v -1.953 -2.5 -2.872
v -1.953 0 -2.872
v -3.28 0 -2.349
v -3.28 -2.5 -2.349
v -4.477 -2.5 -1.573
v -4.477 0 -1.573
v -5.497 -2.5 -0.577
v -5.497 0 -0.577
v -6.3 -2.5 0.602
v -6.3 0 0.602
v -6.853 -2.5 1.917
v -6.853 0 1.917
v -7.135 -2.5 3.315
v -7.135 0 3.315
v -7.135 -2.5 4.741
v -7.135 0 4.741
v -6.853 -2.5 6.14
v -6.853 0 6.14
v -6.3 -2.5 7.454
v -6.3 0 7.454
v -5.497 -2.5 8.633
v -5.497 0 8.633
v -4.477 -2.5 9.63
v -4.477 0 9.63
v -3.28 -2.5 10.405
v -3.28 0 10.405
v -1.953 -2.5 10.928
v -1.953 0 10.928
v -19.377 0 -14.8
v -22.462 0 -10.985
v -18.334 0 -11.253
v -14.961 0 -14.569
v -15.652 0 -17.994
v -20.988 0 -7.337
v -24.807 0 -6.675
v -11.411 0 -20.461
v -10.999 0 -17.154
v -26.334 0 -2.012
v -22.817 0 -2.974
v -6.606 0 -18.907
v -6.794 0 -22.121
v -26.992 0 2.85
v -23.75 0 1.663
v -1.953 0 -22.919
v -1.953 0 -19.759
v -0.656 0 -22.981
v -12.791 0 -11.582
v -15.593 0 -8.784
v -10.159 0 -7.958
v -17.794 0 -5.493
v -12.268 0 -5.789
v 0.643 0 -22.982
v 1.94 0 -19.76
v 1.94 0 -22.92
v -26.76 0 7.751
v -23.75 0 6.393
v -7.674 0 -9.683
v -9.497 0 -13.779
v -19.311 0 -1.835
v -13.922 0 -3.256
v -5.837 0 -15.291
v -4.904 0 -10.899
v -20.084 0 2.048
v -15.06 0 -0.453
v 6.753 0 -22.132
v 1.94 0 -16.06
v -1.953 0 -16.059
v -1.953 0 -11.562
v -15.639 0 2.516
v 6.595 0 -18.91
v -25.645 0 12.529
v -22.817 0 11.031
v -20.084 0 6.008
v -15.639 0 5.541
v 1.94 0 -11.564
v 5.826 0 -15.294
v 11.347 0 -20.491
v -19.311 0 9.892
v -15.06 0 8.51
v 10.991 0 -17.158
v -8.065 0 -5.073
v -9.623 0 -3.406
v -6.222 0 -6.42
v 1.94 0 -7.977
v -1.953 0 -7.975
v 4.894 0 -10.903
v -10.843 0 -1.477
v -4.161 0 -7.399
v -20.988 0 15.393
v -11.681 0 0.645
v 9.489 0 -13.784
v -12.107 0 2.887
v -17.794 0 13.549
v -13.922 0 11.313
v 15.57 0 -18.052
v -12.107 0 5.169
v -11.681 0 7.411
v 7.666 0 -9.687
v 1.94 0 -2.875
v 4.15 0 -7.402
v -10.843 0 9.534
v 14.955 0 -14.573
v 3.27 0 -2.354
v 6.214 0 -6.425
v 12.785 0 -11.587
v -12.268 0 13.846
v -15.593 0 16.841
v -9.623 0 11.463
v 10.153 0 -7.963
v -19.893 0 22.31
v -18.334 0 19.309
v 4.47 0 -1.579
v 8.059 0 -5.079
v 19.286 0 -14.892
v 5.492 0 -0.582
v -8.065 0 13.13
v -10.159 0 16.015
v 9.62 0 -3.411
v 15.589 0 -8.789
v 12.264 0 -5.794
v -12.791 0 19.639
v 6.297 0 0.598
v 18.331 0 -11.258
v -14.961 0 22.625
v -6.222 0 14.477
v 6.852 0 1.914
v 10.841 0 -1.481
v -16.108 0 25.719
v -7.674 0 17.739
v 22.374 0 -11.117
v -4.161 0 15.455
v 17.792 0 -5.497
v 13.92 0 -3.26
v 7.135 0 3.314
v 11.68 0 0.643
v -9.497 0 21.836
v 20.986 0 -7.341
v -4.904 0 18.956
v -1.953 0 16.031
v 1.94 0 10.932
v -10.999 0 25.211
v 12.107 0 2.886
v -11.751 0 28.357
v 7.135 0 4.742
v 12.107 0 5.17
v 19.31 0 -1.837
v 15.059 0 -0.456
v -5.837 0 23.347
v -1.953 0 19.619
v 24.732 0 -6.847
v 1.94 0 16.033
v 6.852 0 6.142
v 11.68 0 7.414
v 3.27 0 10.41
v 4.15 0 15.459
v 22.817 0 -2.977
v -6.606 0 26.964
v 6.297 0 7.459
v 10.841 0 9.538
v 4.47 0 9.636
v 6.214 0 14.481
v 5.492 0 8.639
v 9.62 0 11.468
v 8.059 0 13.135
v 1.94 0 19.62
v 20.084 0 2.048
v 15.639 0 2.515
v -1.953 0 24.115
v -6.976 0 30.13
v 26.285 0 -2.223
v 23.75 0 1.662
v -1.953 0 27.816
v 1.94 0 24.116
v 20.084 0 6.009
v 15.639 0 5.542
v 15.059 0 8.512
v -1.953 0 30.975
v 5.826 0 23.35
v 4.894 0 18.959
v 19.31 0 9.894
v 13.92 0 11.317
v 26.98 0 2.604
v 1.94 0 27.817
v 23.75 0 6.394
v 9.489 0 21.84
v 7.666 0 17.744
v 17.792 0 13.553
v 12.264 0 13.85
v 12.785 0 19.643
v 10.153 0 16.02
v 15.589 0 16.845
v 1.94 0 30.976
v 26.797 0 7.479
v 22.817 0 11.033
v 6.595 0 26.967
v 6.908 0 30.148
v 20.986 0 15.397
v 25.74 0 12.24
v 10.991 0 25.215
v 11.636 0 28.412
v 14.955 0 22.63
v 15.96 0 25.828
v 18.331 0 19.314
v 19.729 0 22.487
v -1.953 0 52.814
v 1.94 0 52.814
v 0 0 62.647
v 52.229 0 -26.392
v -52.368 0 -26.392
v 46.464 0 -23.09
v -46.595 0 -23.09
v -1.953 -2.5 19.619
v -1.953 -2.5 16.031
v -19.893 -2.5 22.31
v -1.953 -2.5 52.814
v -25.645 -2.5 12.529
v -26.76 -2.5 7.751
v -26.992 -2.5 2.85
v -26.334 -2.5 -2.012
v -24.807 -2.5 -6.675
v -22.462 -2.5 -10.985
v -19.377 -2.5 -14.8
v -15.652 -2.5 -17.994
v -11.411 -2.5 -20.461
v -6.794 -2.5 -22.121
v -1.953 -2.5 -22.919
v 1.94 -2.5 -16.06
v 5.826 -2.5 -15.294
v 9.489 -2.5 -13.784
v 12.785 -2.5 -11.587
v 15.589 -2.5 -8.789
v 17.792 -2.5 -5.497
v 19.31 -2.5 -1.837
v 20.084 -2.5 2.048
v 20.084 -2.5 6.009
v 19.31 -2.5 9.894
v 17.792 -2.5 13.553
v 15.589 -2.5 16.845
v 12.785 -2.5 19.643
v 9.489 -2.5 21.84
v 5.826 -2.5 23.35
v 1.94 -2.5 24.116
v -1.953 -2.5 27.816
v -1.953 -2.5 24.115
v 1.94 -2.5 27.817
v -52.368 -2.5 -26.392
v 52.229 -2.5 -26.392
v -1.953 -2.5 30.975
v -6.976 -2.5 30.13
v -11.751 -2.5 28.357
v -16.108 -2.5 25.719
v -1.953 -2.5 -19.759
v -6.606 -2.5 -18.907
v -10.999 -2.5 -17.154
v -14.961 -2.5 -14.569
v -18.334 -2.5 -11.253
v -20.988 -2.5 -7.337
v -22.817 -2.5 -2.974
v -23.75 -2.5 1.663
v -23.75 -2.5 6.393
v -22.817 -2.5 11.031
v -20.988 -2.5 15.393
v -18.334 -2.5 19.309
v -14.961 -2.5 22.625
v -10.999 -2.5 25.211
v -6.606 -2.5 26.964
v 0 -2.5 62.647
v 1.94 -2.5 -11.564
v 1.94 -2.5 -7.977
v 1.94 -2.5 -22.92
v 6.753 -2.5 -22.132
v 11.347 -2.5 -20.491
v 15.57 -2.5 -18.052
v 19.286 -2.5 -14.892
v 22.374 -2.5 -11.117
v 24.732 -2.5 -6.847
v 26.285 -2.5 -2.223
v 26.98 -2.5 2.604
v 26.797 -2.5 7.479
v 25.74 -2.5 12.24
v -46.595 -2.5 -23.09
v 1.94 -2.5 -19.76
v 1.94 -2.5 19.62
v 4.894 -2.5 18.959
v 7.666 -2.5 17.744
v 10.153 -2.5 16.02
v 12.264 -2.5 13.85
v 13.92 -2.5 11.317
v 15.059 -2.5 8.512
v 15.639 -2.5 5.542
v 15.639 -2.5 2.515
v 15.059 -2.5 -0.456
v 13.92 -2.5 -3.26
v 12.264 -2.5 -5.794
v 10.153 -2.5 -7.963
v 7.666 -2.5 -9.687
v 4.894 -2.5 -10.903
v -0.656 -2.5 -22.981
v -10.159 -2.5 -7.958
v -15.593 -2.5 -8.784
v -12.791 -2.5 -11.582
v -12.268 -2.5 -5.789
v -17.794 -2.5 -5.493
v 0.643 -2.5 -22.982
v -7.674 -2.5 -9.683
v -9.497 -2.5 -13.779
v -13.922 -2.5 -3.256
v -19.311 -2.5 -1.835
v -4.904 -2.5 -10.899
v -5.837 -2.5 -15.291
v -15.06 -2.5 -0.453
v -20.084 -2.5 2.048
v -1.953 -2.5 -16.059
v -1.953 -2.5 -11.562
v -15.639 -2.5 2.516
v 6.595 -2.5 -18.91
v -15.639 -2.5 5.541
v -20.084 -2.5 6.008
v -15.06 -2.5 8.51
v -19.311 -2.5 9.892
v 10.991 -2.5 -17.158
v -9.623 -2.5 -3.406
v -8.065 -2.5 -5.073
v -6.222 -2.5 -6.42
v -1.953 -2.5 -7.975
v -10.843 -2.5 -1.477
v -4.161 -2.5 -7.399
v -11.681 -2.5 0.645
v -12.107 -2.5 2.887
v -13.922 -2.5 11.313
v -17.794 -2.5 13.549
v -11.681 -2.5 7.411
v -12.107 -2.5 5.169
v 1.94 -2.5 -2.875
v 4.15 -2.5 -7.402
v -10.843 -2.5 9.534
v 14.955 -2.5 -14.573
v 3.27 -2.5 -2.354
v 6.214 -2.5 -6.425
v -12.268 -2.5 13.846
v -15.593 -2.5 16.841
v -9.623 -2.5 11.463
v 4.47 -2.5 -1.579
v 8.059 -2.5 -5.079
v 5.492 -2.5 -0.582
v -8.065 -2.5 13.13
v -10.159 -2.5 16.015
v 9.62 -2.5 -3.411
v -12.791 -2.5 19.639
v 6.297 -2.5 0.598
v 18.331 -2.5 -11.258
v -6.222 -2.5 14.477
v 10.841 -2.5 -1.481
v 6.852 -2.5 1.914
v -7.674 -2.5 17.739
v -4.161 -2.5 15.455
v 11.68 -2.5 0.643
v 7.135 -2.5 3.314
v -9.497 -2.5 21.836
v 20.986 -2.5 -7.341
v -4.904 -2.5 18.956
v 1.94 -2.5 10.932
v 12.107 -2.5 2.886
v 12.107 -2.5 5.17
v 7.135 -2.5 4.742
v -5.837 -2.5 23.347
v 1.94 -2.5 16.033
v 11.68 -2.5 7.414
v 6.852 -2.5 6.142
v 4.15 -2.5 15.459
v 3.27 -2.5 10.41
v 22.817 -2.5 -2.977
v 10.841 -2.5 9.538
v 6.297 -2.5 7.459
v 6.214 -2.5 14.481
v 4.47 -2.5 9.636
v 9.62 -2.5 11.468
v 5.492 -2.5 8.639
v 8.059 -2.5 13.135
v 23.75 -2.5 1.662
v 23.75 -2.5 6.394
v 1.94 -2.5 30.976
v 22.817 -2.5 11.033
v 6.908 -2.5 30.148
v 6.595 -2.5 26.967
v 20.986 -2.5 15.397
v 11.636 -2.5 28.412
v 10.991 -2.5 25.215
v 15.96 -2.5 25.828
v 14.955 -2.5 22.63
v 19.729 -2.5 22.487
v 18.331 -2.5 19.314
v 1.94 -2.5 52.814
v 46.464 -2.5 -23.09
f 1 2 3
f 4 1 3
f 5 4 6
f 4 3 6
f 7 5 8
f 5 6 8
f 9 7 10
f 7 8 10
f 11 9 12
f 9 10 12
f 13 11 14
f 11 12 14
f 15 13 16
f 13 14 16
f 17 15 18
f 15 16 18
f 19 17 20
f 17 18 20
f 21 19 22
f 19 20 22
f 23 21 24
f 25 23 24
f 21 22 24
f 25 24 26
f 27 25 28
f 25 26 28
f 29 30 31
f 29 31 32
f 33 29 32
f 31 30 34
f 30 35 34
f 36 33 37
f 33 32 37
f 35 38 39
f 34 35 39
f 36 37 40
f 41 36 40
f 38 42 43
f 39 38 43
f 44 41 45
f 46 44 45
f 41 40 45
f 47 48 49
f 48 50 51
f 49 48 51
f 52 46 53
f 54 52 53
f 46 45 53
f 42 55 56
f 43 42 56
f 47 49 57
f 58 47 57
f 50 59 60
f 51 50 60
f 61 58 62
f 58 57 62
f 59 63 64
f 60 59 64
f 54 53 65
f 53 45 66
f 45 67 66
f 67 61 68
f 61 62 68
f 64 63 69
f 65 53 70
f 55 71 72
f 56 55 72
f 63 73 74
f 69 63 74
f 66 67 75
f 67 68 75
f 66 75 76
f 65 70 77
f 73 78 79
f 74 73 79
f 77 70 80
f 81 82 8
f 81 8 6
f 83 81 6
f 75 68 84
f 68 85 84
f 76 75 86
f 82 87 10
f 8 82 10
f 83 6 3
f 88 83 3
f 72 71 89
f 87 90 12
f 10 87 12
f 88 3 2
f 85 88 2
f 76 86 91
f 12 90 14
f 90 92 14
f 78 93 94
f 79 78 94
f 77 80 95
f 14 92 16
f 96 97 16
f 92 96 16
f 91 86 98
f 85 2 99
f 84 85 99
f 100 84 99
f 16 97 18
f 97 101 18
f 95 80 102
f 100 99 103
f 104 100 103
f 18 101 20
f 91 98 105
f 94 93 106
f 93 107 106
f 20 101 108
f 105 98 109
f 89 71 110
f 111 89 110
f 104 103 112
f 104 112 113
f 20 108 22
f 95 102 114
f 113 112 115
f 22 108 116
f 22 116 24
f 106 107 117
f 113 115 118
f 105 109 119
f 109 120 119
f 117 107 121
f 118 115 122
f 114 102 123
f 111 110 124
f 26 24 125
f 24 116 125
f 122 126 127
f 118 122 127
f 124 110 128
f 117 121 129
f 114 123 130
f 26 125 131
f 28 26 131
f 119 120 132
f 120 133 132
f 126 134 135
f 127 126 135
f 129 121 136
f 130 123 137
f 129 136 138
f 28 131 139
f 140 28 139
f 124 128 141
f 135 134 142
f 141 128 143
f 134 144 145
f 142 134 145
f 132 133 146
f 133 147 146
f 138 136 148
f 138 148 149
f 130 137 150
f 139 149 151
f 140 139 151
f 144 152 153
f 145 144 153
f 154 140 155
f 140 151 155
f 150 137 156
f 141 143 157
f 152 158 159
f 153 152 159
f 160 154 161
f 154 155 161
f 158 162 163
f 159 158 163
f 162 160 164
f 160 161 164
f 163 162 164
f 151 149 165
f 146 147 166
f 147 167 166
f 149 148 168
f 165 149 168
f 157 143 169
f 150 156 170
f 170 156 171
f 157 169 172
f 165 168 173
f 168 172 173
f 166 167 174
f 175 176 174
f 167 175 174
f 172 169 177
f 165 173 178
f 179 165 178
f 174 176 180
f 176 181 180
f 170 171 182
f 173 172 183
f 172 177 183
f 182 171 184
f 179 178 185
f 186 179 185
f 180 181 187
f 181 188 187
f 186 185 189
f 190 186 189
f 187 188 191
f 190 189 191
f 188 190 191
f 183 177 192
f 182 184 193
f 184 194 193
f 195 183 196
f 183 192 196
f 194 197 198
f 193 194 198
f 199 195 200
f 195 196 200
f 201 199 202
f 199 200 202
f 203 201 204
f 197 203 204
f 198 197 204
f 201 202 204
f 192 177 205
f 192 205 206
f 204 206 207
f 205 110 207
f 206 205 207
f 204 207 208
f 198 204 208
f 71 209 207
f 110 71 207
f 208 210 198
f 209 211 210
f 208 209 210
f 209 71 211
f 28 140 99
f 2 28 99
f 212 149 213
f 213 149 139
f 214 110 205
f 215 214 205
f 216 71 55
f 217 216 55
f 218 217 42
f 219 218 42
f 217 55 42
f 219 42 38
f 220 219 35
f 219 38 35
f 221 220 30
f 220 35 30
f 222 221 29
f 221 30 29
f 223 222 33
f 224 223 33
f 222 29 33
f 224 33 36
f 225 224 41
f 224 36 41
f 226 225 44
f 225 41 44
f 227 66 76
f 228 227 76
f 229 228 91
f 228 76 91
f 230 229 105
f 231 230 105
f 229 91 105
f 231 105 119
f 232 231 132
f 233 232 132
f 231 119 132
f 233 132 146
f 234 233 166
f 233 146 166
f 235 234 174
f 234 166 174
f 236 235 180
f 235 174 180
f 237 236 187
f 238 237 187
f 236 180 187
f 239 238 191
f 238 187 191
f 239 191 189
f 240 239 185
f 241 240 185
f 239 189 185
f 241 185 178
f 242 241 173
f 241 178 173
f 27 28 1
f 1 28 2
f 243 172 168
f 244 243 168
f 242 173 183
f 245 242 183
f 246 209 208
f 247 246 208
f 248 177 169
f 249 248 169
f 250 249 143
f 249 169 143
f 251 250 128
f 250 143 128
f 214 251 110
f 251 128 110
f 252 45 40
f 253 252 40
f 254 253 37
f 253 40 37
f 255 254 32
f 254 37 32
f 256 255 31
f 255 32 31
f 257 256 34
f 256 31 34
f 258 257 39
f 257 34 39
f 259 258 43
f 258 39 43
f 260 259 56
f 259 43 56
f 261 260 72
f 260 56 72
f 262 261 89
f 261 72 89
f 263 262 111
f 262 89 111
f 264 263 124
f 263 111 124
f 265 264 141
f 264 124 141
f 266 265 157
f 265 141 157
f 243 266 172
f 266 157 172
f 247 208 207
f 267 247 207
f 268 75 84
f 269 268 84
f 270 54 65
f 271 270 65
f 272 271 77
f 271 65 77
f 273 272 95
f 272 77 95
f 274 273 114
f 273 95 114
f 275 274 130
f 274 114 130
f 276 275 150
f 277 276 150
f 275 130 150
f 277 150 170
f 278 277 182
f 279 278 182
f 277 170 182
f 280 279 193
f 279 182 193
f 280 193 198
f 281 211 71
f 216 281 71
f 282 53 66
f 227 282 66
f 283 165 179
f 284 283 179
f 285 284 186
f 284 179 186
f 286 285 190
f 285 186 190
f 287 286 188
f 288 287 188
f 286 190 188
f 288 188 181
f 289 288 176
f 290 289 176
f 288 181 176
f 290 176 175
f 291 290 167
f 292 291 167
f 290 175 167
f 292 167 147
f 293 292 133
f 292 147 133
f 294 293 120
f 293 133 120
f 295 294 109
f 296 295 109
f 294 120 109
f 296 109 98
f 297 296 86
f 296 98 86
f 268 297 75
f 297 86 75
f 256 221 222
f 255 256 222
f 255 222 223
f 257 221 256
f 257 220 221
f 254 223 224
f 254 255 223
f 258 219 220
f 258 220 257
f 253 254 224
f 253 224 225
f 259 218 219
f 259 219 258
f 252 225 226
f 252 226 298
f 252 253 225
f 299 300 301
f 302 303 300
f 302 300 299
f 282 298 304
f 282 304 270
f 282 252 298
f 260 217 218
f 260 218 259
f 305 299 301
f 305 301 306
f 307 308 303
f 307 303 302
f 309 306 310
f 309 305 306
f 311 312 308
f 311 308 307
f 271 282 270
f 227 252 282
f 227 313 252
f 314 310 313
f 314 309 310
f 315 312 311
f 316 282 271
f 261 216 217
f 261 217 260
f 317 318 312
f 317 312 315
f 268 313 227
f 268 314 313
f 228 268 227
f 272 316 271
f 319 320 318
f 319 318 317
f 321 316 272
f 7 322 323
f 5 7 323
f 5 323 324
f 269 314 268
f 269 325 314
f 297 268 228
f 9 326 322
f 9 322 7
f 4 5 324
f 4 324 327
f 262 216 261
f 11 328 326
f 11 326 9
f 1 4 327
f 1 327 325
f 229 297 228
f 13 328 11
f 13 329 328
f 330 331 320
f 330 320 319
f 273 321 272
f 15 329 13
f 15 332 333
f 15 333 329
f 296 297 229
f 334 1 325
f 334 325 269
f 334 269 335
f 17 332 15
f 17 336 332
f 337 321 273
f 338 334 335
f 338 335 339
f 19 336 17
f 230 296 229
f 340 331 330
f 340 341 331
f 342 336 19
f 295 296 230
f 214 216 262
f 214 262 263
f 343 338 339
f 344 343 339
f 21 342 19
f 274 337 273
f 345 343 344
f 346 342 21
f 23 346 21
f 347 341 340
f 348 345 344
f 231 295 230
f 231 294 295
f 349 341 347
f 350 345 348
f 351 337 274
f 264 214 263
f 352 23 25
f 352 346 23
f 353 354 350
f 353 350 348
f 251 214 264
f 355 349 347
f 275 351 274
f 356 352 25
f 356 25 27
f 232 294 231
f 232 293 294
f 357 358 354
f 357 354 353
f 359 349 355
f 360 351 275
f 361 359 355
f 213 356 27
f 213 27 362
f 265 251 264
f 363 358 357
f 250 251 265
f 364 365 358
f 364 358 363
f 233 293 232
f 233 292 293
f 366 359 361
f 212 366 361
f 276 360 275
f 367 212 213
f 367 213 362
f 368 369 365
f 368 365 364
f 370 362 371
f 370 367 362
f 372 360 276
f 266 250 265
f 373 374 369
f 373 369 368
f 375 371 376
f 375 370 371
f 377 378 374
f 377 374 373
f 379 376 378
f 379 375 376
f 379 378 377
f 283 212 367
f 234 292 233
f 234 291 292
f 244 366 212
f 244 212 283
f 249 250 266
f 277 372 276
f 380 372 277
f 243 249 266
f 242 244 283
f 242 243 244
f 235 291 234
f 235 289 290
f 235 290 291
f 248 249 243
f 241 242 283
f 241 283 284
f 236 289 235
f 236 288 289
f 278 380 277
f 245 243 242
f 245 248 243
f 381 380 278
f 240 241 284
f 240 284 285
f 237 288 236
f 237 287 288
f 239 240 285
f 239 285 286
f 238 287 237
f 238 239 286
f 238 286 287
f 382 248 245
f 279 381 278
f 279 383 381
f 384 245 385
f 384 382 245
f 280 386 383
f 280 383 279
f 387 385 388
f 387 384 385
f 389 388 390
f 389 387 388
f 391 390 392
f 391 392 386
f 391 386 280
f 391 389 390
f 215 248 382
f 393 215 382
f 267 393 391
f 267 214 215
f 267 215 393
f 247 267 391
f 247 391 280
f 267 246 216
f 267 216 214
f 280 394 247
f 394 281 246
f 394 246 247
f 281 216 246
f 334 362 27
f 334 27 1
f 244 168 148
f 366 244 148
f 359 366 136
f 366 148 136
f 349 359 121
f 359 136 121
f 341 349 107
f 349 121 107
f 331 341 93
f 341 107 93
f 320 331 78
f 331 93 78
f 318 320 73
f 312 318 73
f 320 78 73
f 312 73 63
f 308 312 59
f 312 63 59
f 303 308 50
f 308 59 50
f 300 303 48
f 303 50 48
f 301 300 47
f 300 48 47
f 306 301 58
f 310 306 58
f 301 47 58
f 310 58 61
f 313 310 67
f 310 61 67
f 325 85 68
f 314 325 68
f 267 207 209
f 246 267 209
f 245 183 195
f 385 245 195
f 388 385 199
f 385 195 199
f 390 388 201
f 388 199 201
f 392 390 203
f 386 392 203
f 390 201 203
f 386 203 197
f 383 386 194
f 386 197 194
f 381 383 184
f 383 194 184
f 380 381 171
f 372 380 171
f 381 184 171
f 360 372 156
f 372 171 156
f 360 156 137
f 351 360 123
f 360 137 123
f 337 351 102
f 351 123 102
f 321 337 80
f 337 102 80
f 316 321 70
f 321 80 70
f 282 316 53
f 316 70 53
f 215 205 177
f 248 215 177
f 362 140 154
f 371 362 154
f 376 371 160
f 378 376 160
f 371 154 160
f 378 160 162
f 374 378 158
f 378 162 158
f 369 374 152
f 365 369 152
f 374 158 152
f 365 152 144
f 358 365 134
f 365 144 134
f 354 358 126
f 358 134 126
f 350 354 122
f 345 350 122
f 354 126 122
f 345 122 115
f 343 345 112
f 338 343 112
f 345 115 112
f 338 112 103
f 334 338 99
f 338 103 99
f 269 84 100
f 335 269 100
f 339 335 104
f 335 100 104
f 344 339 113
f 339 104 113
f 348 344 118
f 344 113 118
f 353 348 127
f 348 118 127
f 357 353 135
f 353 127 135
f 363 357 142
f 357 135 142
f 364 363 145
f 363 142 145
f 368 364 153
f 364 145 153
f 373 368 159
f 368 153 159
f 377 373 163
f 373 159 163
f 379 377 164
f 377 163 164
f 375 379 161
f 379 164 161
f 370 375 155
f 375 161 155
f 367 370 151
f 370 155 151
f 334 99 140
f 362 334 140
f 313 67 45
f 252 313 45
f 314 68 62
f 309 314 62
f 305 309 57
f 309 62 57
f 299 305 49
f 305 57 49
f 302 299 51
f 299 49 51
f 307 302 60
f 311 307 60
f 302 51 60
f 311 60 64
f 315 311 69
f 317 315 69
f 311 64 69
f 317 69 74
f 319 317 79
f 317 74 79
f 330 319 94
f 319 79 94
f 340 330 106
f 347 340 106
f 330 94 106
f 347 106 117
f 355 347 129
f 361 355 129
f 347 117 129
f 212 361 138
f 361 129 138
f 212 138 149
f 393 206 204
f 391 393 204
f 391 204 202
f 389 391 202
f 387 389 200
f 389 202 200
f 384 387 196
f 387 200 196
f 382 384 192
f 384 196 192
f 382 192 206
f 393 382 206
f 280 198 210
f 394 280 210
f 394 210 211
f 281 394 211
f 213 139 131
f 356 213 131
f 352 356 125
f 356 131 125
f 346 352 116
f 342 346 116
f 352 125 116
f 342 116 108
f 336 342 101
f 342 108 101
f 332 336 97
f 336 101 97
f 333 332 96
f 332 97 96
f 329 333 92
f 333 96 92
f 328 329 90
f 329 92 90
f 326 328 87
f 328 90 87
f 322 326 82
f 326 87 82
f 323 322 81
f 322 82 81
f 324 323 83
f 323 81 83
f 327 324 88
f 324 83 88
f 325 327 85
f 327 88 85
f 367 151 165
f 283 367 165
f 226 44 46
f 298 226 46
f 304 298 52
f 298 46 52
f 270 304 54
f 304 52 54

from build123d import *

# Parameters (mm, degrees)
F1_DEPTH = 2.5


with BuildPart() as f1:
    # F0 (on Front) → F1 (new body)
    with BuildSketch(Plane.XZ):
        Polygon((52.2287525237, -26.3921879232), (0, 62.6467168331), (-52.367657423, -26.3921879232), align=None)
        Polygon((25.7395030085, 12.2401500318), (46.4636957768, -23.0901869354), (1.9398448926, -23.0901869354), (-1.9525762507, -23.0901869354), (-46.5948404749, -23.0901869354), (-25.6454423536, 12.5293453449), (-19.8928530583, 22.3102726494), (-1.9525762507, 52.8135007214), (-0.0037810953, 56.1269692776), (1.9398448926, 52.8135007214), (19.728690651, 22.4873055381), align=None, mode=Mode.SUBTRACT)
        with BuildLine():
            ThreePointArc((-1.9525762507, -22.9187820592), (-0.0063822594, -22.989430241), (1.9398448926, -22.9197015464))
            Line((1.9398448926, -22.9197015464), (1.9398448926, -19.7604708833))
            Line((1.9398448926, -19.7604708833), (1.9398448926, -16.0598084555))
            Line((1.9398448926, -16.0598084555), (1.9398448926, -11.5638747518))
            Line((1.9398448926, -11.5638747518), (1.9398448926, -7.9767906652))
            Line((1.9398448926, -7.9767906652), (1.9398448926, -2.8751975899))
            Line((1.9398448926, -2.8751975899), (1.9398448926, 10.9317609152))
            Line((1.9398448926, 10.9317609152), (1.9398448926, 16.0333539904))
            Line((1.9398448926, 16.0333539904), (1.9398448926, 19.620438077))
            Line((1.9398448926, 19.620438077), (1.9398448926, 24.1163717807))
            Line((1.9398448926, 24.1163717807), (1.9398448926, 27.8170342086))
            Line((1.9398448926, 27.8170342086), (1.9398448926, 30.9762648716))
            Line((1.9398448926, 30.9762648716), (1.9398448926, 52.8135007214))
            Line((1.9398448926, 52.8135007214), (-0.0037810953, 56.1269692776))
            Line((-0.0037810953, 56.1269692776), (-1.9525762507, 52.8135007214))
            Line((-1.9525762507, 52.8135007214), (-1.9525762507, 30.9753453844))
            Line((-1.9525762507, 30.9753453844), (-1.9525762507, 27.8159926051))
            Line((-1.9525762507, 27.8159926051), (-1.9525762507, 24.1151382805))
            Line((-1.9525762507, 24.1151382805), (-1.9525762507, 19.6188488698))
            Line((-1.9525762507, 19.6188488698), (-1.9525762507, 16.0312898601))
            Line((-1.9525762507, 16.0312898601), (-1.9525762507, 10.9281707909))
            Line((-1.9525762507, 10.9281707909), (-1.9525762507, -2.8716074657))
            Line((-1.9525762507, -2.8716074657), (-1.9525762507, -7.9747265348))
            Line((-1.9525762507, -7.9747265348), (-1.9525762507, -11.5622855446))
            Line((-1.9525762507, -11.5622855446), (-1.9525762507, -16.0585749552))
            Line((-1.9525762507, -16.0585749552), (-1.9525762507, -19.7594292799))
            Line((-1.9525762507, -19.7594292799), (-1.9525762507, -22.9187820592))
        make_face()
        with BuildLine():
            ThreePointArc((-25.6454423536, 12.5293453449), (-22.4623037962, -10.9851025464), (-1.9525762507, -22.9187820592))
            Line((-1.9525762507, -22.9187820592), (-1.9525762507, -19.7594292799))
            ThreePointArc((-1.9525762507, -19.7594292799), (-23.8677134619, 4.0282816626), (-1.9525762507, 27.8159926051))
            Line((-1.9525762507, 27.8159926051), (-1.9525762507, 30.9753453844))
            ThreePointArc((-1.9525762507, 30.9753453844), (-11.750598572, 28.35687041), (-19.8928530583, 22.3102726494))
            Line((-19.8928530583, 22.3102726494), (-25.6454423536, 12.5293453449))
        make_face()
        with BuildLine():
            Line((1.9398448926, -11.5638747518), (1.9398448926, -16.0598084555))
            ThreePointArc((1.9398448926, -16.0598084555), (20.1815351943, 4.0282816626), (1.9398448926, 24.1163717807))
            Line((1.9398448926, 24.1163717807), (1.9398448926, 19.620438077))
            ThreePointArc((1.9398448926, 19.620438077), (15.712362644, 4.0282816626), (1.9398448926, -11.5638747518))
        make_face()
        with BuildLine():
            ThreePointArc((-1.9525762507, 24.1151382805), (-20.1815351943, 4.0282816626), (-1.9525762507, -16.0585749552))
            Line((-1.9525762507, -16.0585749552), (-1.9525762507, -11.5622855446))
            ThreePointArc((-1.9525762507, -11.5622855446), (-15.712362644, 4.0282816626), (-1.9525762507, 19.6188488698))
            Line((-1.9525762507, 19.6188488698), (-1.9525762507, 24.1151382805))
        make_face()
        with BuildLine():
            ThreePointArc((1.9398448926, -22.9197015464), (22.3738768614, -11.1165666837), (25.7395030085, 12.2401500318))
            Line((25.7395030085, 12.2401500318), (19.728690651, 22.4873055381))
            ThreePointArc((19.728690651, 22.4873055381), (11.636020187, 28.411879253), (1.9398448926, 30.9762648716))
            Line((1.9398448926, 30.9762648716), (1.9398448926, 27.8170342086))
            ThreePointArc((1.9398448926, 27.8170342086), (23.8677134619, 4.0282816626), (1.9398448926, -19.7604708833))
            Line((1.9398448926, -19.7604708833), (1.9398448926, -22.9197015464))
        make_face()
        with BuildLine():
            Line((1.9398448926, -2.8751975899), (1.9398448926, -7.9767906652))
            ThreePointArc((1.9398448926, -7.9767906652), (12.1607877953, 4.0282816626), (1.9398448926, 16.0333539904))
            Line((1.9398448926, 16.0333539904), (1.9398448926, 10.9317609152))
            ThreePointArc((1.9398448926, 10.9317609152), (7.1708454172, 4.0282816626), (1.9398448926, -2.8751975899))
        make_face()
        with BuildLine():
            ThreePointArc((-1.9525762507, 16.0312898601), (-12.1607877953, 4.0282816626), (-1.9525762507, -7.9747265348))
            Line((-1.9525762507, -7.9747265348), (-1.9525762507, -2.8716074657))
            ThreePointArc((-1.9525762507, -2.8716074657), (-7.1708454172, 4.0282816626), (-1.9525762507, 10.9281707909))
            Line((-1.9525762507, 10.9281707909), (-1.9525762507, 16.0312898601))
        make_face()
    extrude(amount=F1_DEPTH)


solid = f1.part
